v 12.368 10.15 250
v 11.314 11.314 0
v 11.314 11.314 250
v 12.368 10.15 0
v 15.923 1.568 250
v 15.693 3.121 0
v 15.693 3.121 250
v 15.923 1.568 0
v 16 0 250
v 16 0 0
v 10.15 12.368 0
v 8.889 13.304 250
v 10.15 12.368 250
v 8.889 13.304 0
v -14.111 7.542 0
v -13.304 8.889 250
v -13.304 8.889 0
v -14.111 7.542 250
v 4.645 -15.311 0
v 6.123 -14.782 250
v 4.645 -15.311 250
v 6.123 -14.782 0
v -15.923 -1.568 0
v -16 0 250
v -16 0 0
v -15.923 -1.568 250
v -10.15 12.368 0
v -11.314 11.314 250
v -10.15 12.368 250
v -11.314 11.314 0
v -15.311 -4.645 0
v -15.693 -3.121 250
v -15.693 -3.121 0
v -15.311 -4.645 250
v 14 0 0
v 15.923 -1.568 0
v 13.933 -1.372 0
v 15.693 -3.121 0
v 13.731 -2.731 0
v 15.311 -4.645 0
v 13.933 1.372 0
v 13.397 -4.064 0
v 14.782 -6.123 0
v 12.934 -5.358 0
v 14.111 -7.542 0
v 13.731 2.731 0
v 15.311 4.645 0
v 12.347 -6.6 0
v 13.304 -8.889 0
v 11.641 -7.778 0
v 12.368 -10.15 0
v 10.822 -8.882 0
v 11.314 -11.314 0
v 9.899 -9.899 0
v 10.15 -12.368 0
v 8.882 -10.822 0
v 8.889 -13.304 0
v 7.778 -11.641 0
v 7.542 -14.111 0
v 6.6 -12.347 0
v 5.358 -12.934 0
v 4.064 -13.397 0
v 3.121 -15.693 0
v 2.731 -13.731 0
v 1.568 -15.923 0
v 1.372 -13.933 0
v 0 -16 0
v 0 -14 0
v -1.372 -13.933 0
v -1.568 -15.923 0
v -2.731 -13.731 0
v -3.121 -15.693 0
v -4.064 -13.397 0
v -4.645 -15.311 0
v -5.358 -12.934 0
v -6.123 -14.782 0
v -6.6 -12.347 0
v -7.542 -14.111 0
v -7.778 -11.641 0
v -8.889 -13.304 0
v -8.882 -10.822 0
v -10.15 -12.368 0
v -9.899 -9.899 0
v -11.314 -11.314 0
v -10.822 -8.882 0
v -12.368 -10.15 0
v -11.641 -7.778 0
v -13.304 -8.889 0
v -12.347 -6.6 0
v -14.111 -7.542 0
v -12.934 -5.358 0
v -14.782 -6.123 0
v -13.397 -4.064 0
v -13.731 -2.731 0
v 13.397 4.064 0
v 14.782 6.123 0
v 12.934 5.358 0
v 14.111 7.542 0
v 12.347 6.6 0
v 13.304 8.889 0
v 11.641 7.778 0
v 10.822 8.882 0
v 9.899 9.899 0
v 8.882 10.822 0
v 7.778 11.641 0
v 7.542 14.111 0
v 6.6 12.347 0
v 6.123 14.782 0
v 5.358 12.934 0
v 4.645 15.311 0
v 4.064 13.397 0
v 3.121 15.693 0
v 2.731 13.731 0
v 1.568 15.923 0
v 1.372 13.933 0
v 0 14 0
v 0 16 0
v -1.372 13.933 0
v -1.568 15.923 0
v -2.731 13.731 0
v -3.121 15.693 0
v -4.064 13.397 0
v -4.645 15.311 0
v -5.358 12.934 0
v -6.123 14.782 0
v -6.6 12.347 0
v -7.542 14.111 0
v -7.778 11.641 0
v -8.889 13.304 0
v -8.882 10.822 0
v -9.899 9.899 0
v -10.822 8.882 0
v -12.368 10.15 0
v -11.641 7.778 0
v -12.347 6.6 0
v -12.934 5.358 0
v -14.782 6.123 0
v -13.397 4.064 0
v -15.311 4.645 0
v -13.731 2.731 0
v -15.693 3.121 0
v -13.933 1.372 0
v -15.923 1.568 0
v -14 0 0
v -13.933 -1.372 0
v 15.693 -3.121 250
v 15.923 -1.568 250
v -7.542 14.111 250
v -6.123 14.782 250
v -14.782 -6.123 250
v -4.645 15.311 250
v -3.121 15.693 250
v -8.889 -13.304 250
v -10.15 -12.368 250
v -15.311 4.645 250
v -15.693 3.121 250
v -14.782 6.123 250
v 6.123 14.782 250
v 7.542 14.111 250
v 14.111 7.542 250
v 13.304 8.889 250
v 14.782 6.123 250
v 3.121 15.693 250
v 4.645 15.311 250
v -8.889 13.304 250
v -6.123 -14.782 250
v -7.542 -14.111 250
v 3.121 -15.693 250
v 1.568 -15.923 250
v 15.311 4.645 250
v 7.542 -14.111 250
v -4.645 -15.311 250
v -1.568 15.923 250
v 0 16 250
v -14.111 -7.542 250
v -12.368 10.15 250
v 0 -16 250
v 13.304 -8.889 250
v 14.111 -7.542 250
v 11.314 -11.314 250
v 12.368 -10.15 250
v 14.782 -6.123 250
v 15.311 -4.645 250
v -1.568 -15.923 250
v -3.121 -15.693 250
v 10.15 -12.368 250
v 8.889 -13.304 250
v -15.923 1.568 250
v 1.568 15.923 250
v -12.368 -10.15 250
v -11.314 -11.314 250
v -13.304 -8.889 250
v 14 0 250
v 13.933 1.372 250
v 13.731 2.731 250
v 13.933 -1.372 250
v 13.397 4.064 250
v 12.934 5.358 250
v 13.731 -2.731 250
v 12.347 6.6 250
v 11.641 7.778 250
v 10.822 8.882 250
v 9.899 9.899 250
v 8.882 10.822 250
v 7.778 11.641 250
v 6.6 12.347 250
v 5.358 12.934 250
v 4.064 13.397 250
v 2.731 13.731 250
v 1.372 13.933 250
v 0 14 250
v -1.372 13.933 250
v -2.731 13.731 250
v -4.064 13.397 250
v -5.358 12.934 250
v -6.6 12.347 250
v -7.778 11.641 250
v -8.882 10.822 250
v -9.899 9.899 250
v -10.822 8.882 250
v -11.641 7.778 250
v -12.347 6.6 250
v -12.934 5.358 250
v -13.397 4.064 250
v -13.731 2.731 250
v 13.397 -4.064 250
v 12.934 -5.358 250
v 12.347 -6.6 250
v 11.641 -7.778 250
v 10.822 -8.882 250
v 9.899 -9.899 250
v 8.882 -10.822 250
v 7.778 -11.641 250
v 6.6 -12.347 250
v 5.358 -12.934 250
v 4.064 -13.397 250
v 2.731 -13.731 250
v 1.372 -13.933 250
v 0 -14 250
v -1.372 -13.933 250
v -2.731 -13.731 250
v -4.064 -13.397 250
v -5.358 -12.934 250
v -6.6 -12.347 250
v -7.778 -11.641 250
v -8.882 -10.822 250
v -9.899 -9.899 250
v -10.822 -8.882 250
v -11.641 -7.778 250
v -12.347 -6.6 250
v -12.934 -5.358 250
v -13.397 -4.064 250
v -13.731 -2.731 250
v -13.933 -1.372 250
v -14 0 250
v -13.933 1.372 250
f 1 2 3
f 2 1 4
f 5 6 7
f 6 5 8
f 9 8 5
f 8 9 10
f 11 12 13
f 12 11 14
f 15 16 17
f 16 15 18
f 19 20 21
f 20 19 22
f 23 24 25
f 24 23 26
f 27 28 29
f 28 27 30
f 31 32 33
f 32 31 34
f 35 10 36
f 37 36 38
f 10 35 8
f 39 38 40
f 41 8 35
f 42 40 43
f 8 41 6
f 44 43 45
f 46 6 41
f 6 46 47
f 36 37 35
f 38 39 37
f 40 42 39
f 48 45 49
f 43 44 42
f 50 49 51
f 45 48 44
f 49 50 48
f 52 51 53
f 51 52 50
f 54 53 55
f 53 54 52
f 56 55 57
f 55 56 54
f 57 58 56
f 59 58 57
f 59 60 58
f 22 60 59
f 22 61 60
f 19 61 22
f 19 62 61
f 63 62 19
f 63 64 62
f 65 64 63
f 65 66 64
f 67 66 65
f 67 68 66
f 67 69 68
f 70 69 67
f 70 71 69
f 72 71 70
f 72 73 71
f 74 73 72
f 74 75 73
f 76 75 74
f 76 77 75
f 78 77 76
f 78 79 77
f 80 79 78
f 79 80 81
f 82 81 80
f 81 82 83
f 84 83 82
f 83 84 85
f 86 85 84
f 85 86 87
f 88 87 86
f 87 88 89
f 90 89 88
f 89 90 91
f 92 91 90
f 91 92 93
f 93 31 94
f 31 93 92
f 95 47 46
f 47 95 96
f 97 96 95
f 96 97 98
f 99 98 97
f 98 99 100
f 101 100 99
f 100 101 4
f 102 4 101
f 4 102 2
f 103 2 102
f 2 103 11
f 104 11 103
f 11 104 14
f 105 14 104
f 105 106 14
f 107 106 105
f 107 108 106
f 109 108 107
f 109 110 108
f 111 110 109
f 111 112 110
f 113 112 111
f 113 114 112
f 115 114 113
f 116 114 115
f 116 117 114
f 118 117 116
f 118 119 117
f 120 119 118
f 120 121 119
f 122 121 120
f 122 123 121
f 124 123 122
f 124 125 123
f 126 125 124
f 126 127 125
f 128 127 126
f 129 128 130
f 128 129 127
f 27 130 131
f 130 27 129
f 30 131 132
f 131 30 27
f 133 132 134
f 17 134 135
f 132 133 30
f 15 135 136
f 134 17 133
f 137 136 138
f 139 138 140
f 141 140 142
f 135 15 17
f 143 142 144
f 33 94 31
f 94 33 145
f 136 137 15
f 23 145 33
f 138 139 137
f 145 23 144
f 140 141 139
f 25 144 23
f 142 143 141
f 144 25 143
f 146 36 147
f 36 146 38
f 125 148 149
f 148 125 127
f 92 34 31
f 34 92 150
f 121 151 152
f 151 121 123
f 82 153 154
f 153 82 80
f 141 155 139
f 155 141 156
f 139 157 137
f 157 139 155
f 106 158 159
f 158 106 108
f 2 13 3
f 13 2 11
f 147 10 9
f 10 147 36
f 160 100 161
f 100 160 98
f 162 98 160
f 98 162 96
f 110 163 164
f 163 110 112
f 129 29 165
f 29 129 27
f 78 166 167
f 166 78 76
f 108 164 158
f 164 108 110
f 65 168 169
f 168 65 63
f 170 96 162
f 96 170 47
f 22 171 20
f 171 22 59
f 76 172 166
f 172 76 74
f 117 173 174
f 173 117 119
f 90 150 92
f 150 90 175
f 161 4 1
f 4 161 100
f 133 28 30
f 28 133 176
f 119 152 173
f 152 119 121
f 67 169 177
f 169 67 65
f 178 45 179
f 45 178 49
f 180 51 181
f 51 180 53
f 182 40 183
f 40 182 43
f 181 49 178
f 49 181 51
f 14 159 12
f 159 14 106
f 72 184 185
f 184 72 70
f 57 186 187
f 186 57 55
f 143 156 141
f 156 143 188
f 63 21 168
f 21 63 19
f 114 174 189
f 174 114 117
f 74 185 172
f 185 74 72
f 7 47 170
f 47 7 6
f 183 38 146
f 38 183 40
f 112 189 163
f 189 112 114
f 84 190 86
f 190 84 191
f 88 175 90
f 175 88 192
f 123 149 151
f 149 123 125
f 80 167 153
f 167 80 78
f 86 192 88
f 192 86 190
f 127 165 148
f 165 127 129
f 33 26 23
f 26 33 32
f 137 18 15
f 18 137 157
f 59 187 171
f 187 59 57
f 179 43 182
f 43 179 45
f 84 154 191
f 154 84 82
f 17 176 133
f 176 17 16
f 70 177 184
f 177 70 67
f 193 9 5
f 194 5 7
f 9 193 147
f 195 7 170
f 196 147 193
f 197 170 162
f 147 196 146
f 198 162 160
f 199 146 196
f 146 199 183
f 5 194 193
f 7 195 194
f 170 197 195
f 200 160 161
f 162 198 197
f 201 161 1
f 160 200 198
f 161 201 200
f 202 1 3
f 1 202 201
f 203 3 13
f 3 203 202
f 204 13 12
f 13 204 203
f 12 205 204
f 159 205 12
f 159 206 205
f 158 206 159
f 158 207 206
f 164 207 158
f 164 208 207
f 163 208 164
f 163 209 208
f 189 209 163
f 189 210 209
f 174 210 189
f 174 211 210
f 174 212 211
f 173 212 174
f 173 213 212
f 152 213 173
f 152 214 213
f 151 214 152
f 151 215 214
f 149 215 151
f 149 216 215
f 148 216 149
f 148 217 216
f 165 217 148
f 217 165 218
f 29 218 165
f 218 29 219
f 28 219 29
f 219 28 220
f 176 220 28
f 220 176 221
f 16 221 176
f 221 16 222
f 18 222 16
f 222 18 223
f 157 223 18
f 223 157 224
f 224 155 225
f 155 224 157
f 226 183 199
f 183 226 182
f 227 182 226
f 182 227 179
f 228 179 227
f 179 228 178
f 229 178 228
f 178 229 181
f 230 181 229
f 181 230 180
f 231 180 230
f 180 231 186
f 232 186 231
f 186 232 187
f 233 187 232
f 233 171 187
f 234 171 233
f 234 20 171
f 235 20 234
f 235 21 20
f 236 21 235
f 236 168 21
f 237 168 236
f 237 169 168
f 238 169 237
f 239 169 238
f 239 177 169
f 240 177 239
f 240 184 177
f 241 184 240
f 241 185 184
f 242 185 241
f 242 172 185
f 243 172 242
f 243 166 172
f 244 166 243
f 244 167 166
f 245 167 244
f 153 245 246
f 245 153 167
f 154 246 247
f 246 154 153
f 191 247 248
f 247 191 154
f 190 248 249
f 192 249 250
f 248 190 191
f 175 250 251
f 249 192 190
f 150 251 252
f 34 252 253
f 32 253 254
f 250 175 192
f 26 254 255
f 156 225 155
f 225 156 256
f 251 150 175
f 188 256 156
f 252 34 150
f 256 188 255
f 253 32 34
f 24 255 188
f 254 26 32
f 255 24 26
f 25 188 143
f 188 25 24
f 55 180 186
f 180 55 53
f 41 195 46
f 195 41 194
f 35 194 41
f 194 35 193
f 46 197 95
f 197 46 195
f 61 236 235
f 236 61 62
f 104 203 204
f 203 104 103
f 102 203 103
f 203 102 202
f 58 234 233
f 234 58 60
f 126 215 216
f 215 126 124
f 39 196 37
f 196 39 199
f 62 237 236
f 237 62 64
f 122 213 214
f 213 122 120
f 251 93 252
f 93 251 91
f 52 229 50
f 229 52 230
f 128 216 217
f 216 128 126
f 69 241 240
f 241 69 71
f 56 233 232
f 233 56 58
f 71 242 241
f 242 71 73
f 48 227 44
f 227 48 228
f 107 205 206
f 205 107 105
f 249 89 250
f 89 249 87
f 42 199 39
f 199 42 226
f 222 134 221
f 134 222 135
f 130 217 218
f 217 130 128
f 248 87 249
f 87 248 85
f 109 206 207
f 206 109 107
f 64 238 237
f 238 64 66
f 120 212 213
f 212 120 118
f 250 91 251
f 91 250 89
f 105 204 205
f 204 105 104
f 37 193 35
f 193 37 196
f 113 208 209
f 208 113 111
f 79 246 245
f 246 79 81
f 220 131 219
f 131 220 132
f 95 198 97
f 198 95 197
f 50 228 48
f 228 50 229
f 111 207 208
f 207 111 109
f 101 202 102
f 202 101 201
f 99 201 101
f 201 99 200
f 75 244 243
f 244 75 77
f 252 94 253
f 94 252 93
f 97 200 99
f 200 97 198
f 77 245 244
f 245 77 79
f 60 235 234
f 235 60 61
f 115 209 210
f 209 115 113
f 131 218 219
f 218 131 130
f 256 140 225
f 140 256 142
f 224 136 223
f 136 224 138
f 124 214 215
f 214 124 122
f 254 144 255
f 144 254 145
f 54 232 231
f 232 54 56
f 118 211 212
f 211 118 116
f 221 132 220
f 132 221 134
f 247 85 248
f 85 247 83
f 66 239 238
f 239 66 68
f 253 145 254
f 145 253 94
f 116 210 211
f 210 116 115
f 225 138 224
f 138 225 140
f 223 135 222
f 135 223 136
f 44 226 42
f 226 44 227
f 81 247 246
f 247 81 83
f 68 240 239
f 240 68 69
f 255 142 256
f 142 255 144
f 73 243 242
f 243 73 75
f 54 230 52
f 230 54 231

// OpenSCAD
difference() {
    cylinder(h=250, d=32, $fn=64);
    translate([0, 0, -1])
        cylinder(h=252, d=28, $fn=64);
}
